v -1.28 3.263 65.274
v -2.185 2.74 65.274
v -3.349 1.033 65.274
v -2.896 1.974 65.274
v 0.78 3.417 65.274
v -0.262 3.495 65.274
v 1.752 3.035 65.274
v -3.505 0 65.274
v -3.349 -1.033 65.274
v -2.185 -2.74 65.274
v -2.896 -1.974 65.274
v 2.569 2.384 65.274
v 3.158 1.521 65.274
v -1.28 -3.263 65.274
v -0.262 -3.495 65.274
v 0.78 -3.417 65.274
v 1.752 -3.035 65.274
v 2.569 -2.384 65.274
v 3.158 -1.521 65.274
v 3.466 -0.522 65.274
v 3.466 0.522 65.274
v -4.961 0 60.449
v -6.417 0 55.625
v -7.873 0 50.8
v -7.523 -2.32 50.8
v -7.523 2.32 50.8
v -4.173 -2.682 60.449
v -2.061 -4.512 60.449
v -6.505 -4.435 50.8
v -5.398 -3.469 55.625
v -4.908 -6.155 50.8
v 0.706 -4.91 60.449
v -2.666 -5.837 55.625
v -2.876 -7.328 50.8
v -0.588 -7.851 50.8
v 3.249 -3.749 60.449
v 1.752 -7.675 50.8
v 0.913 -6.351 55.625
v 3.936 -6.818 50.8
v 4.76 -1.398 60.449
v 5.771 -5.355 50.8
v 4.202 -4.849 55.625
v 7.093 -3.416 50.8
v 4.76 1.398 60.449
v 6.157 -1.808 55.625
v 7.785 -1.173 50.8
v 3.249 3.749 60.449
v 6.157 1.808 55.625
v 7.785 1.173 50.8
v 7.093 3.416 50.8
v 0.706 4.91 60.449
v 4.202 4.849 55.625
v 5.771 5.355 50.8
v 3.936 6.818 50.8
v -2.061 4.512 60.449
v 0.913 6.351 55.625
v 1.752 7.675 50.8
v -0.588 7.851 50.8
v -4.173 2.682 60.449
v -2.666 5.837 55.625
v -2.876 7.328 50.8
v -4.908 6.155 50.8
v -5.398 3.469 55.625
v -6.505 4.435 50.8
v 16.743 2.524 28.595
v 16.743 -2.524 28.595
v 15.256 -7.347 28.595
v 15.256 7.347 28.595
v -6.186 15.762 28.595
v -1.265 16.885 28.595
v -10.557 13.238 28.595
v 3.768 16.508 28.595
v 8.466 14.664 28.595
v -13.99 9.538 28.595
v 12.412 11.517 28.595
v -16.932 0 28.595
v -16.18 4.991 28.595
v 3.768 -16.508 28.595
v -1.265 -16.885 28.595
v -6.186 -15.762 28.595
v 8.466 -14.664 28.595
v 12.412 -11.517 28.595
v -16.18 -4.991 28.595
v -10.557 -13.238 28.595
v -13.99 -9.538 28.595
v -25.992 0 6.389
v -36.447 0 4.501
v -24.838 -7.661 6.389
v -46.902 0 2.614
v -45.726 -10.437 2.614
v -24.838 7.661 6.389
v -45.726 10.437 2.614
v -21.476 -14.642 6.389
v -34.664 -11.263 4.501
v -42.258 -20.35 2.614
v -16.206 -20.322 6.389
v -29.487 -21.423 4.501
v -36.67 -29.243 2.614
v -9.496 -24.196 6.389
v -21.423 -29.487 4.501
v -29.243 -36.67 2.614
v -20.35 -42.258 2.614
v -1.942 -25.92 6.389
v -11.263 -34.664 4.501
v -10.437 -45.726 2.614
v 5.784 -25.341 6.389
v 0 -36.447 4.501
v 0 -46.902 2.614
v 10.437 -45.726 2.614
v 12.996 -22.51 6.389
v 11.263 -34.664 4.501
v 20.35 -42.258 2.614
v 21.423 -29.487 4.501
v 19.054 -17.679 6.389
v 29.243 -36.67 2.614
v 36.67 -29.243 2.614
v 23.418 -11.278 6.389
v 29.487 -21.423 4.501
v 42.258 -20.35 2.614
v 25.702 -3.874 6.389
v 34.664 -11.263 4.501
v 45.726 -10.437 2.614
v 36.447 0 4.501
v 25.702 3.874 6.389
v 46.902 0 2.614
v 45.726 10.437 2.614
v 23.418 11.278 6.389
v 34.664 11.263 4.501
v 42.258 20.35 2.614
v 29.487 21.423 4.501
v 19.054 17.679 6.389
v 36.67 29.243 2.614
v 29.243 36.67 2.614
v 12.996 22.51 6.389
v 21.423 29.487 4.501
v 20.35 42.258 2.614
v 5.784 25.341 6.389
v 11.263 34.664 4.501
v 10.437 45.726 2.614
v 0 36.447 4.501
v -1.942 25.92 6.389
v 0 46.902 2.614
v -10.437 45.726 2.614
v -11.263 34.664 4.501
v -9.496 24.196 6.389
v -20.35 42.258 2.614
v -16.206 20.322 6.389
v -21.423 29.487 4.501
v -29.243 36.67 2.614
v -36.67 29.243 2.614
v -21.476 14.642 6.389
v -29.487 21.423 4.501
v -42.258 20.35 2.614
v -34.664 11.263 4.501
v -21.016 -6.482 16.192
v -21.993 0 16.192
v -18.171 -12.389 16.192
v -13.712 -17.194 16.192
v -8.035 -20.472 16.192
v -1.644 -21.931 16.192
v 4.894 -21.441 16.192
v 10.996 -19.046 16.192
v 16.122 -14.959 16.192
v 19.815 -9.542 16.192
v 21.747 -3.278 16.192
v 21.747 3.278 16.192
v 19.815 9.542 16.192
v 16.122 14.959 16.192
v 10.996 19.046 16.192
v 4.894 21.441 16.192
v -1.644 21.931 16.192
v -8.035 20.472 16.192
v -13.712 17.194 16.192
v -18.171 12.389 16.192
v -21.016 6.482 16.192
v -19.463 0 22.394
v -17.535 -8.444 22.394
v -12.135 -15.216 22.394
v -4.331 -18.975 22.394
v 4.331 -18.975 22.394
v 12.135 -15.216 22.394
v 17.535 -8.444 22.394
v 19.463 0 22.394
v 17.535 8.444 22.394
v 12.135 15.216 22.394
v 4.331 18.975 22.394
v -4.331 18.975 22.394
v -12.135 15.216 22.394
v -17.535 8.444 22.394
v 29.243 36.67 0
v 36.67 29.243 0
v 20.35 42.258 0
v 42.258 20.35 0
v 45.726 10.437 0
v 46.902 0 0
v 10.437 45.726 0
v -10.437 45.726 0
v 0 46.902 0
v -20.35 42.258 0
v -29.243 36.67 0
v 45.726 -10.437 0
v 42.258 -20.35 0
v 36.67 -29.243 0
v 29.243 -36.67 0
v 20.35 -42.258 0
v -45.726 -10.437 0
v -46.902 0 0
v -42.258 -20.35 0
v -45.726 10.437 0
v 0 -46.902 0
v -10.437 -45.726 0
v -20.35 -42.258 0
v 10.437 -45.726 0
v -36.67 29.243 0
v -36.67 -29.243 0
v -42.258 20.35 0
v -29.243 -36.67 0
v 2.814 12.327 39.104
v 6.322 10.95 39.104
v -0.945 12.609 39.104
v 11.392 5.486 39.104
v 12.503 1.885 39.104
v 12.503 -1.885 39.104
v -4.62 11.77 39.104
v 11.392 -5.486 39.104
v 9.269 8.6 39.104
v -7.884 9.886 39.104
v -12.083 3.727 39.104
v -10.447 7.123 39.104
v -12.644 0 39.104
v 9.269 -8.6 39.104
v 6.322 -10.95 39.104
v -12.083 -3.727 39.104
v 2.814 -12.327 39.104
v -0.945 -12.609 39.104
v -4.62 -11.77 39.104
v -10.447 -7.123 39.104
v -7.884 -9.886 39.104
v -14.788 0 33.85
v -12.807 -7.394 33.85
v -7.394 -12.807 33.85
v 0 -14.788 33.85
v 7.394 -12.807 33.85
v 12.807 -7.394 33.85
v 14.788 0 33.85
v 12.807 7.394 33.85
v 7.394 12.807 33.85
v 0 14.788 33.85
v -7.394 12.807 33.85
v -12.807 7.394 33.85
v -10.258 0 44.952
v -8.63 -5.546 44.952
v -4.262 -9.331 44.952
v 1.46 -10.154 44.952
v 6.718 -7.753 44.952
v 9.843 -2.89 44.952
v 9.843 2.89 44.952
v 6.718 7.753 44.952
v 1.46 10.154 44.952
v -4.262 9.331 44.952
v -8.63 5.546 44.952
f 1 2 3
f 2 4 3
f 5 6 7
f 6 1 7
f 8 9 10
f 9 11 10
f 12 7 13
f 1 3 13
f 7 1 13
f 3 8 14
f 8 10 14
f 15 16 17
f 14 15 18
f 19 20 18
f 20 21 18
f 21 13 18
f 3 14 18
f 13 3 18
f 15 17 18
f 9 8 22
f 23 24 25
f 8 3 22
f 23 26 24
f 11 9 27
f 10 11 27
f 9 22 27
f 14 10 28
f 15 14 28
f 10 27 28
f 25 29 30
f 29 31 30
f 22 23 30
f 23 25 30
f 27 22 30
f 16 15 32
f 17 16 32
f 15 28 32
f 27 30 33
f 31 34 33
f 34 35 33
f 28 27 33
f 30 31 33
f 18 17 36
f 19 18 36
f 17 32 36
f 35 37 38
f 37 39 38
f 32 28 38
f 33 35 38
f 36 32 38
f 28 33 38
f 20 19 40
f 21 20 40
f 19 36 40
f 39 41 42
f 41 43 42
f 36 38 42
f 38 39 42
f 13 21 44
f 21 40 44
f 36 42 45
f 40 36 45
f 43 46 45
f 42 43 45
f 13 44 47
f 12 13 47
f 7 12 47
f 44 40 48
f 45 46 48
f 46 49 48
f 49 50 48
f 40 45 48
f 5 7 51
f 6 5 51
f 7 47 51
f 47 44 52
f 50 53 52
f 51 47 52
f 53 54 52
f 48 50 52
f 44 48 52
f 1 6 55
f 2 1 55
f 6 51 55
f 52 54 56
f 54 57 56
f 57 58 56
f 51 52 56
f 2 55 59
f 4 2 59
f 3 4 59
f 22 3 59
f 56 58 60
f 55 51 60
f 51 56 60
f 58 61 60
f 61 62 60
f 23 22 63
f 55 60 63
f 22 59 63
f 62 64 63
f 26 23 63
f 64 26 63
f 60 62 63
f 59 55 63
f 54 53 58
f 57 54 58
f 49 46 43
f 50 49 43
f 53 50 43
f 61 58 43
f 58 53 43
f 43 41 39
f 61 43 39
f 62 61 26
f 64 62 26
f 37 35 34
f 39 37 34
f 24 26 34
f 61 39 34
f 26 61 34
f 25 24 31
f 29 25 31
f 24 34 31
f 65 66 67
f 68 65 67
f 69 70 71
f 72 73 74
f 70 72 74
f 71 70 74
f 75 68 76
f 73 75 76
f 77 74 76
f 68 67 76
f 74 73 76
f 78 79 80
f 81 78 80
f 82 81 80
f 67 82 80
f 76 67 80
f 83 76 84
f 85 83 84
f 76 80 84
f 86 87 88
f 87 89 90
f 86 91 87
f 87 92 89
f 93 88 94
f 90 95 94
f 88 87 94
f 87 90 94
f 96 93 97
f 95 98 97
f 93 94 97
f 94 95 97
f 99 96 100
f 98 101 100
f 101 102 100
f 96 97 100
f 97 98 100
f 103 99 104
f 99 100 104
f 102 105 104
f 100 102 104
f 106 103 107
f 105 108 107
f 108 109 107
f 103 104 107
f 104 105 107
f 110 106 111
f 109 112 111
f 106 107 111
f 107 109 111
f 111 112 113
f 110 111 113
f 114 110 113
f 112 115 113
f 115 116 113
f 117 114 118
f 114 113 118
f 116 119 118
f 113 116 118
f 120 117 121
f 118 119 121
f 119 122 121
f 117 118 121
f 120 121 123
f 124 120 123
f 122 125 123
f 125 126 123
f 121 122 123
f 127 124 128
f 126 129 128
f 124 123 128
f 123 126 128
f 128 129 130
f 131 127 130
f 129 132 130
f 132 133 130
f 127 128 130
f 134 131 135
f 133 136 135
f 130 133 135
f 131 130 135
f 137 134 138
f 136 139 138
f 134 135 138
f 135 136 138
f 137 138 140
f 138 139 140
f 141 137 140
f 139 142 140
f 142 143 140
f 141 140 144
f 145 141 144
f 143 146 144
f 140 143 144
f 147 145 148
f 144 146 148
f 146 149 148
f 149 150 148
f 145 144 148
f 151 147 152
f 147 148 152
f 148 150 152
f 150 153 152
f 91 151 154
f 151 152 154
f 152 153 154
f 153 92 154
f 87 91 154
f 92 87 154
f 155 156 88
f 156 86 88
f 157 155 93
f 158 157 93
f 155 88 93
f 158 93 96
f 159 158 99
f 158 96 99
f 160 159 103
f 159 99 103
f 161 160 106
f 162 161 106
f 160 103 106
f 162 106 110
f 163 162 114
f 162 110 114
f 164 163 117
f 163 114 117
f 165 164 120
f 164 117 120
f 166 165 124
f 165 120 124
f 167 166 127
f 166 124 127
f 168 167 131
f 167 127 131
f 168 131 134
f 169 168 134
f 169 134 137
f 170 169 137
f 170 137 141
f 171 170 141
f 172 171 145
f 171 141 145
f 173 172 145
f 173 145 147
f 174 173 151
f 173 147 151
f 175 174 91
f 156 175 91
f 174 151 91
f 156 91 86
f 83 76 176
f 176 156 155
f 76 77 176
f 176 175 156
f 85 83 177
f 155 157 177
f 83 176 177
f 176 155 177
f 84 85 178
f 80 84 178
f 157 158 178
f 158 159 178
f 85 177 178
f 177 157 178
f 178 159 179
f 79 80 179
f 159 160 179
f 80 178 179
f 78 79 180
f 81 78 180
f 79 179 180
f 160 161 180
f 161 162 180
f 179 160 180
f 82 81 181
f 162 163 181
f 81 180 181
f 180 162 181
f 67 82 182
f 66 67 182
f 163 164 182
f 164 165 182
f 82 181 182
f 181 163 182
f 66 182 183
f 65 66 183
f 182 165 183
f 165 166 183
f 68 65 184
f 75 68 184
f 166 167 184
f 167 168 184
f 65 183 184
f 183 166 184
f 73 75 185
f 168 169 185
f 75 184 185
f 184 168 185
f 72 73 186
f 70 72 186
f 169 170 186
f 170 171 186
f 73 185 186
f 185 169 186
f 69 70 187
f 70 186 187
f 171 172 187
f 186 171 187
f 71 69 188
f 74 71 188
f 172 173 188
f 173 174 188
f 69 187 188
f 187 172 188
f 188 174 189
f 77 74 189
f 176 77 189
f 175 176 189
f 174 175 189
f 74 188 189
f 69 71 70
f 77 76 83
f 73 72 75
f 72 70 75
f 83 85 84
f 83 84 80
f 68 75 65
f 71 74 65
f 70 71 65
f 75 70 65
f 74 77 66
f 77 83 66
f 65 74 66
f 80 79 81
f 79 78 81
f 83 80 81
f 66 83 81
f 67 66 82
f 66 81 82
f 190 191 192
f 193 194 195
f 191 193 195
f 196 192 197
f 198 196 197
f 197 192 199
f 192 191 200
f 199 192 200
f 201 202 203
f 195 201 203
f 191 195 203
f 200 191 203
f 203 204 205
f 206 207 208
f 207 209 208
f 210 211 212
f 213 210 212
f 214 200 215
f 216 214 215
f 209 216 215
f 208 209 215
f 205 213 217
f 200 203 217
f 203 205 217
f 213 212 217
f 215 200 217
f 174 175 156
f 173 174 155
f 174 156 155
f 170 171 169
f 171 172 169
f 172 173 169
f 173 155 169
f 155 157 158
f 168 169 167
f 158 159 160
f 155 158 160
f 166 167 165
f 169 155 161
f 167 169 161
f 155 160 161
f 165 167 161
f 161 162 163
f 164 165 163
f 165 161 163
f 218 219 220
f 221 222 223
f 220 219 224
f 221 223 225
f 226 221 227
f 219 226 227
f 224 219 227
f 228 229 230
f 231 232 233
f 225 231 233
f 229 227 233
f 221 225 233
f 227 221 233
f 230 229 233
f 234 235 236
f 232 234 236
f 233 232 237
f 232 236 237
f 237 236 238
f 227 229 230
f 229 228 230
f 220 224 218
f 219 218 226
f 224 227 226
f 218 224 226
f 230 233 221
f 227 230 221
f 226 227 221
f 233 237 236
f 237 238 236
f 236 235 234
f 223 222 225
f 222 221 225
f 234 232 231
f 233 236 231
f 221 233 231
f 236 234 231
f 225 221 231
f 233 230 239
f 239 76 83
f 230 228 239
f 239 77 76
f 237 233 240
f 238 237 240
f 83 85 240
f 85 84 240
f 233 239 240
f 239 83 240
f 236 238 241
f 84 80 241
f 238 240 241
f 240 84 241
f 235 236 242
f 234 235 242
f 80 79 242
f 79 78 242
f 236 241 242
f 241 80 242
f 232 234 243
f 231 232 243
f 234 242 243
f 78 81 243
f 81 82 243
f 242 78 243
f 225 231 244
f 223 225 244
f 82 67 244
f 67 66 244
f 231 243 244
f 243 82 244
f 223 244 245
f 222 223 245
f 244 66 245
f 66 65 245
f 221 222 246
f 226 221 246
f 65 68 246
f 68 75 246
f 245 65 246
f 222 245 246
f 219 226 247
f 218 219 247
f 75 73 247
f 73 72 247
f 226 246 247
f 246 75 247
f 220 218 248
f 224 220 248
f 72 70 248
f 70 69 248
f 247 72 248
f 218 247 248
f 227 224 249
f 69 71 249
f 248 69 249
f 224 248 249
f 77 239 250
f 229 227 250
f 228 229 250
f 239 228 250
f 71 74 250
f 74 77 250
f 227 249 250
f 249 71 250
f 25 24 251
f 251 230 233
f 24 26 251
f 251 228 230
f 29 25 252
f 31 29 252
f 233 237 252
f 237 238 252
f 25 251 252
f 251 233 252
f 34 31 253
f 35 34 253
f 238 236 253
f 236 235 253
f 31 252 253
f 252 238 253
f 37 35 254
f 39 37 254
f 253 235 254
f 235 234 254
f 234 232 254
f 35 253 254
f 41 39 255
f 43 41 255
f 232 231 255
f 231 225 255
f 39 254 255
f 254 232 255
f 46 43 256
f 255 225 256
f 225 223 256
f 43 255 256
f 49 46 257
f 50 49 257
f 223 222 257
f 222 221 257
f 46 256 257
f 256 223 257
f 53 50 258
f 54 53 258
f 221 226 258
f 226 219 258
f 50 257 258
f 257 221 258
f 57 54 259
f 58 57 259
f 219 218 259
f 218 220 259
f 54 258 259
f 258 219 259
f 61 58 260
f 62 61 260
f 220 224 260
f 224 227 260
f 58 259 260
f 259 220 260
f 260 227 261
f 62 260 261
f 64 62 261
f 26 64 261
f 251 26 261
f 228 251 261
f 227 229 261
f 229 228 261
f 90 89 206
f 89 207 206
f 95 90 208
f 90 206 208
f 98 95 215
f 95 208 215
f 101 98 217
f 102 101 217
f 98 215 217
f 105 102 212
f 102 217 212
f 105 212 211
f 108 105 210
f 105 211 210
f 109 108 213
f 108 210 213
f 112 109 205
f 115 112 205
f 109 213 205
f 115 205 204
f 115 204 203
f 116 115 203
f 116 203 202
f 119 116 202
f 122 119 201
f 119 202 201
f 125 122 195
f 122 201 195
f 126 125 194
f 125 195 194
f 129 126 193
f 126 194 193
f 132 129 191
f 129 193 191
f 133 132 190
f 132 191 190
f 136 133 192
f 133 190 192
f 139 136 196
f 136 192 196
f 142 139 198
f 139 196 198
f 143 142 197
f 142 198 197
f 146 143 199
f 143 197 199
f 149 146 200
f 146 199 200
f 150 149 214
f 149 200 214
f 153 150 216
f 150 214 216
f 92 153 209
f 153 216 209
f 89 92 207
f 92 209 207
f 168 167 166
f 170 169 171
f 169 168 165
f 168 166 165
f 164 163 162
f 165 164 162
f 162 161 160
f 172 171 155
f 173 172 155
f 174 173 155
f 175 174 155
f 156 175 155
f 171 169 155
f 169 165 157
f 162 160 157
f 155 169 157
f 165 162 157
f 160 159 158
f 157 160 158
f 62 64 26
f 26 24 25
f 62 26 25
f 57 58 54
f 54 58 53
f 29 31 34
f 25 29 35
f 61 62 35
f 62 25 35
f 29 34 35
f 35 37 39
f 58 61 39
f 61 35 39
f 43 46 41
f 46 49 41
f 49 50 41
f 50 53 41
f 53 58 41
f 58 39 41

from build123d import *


with BuildPart() as f1:
    # F0 (on Front) → F1 (revolve)
    with BuildSketch(Plane.XZ):
        Polygon((-12.644363, 39.104443), (0, 39.104443), (0, 50.8), (-7.872514, 50.8), align=None)
    revolve(axis=Axis((0, 0, 25.4), (0, 0, 1)))


with BuildPart() as f2:
    # F0 (on Front) → F2 (revolve)
    with BuildSketch(Plane.XZ):
        Polygon((-16.932437, 28.594592), (0, 28.594592), (0, 39.104443), (-12.644363, 39.104443), align=None)
    revolve(axis=Axis((0, 0, 25.4), (0, 0, 1)))


with BuildPart() as f3:
    # F0 (on Front) → F3 (revolve)
    with BuildSketch(Plane.XZ):
        Polygon((-21.992569, 16.192467), (0, 16.192467), (0, 28.594592), (-16.932437, 28.594592), align=None)
    revolve(axis=Axis((0, 0, 25.4), (0, 0, 1)))


with BuildPart() as f4:
    # F0 (on Front) → F4 (revolve)
    with BuildSketch(Plane.XZ):
        Polygon((-46.902414, 0), (0, 0), (0, 16.192467), (-21.992569, 16.192467), (-25.99236, 6.389183), (-46.902414, 2.613757), align=None)
    revolve(axis=Axis((0, 0, 25.4), (0, 0, 1)))


with BuildPart() as f5:
    # F0 (on Front) → F5 (revolve)
    with BuildSketch(Plane.XZ):
        Polygon((-7.872514, 50.8), (0, 50.8), (0, 59.367437), (0, 65.273613), (-3.504879, 65.273613), align=None)
    revolve(axis=Axis((0, 0, 58.036806), (0, 0, 1)))


solid = Compound([f1.part, f2.part, f3.part, f4.part, f5.part])
